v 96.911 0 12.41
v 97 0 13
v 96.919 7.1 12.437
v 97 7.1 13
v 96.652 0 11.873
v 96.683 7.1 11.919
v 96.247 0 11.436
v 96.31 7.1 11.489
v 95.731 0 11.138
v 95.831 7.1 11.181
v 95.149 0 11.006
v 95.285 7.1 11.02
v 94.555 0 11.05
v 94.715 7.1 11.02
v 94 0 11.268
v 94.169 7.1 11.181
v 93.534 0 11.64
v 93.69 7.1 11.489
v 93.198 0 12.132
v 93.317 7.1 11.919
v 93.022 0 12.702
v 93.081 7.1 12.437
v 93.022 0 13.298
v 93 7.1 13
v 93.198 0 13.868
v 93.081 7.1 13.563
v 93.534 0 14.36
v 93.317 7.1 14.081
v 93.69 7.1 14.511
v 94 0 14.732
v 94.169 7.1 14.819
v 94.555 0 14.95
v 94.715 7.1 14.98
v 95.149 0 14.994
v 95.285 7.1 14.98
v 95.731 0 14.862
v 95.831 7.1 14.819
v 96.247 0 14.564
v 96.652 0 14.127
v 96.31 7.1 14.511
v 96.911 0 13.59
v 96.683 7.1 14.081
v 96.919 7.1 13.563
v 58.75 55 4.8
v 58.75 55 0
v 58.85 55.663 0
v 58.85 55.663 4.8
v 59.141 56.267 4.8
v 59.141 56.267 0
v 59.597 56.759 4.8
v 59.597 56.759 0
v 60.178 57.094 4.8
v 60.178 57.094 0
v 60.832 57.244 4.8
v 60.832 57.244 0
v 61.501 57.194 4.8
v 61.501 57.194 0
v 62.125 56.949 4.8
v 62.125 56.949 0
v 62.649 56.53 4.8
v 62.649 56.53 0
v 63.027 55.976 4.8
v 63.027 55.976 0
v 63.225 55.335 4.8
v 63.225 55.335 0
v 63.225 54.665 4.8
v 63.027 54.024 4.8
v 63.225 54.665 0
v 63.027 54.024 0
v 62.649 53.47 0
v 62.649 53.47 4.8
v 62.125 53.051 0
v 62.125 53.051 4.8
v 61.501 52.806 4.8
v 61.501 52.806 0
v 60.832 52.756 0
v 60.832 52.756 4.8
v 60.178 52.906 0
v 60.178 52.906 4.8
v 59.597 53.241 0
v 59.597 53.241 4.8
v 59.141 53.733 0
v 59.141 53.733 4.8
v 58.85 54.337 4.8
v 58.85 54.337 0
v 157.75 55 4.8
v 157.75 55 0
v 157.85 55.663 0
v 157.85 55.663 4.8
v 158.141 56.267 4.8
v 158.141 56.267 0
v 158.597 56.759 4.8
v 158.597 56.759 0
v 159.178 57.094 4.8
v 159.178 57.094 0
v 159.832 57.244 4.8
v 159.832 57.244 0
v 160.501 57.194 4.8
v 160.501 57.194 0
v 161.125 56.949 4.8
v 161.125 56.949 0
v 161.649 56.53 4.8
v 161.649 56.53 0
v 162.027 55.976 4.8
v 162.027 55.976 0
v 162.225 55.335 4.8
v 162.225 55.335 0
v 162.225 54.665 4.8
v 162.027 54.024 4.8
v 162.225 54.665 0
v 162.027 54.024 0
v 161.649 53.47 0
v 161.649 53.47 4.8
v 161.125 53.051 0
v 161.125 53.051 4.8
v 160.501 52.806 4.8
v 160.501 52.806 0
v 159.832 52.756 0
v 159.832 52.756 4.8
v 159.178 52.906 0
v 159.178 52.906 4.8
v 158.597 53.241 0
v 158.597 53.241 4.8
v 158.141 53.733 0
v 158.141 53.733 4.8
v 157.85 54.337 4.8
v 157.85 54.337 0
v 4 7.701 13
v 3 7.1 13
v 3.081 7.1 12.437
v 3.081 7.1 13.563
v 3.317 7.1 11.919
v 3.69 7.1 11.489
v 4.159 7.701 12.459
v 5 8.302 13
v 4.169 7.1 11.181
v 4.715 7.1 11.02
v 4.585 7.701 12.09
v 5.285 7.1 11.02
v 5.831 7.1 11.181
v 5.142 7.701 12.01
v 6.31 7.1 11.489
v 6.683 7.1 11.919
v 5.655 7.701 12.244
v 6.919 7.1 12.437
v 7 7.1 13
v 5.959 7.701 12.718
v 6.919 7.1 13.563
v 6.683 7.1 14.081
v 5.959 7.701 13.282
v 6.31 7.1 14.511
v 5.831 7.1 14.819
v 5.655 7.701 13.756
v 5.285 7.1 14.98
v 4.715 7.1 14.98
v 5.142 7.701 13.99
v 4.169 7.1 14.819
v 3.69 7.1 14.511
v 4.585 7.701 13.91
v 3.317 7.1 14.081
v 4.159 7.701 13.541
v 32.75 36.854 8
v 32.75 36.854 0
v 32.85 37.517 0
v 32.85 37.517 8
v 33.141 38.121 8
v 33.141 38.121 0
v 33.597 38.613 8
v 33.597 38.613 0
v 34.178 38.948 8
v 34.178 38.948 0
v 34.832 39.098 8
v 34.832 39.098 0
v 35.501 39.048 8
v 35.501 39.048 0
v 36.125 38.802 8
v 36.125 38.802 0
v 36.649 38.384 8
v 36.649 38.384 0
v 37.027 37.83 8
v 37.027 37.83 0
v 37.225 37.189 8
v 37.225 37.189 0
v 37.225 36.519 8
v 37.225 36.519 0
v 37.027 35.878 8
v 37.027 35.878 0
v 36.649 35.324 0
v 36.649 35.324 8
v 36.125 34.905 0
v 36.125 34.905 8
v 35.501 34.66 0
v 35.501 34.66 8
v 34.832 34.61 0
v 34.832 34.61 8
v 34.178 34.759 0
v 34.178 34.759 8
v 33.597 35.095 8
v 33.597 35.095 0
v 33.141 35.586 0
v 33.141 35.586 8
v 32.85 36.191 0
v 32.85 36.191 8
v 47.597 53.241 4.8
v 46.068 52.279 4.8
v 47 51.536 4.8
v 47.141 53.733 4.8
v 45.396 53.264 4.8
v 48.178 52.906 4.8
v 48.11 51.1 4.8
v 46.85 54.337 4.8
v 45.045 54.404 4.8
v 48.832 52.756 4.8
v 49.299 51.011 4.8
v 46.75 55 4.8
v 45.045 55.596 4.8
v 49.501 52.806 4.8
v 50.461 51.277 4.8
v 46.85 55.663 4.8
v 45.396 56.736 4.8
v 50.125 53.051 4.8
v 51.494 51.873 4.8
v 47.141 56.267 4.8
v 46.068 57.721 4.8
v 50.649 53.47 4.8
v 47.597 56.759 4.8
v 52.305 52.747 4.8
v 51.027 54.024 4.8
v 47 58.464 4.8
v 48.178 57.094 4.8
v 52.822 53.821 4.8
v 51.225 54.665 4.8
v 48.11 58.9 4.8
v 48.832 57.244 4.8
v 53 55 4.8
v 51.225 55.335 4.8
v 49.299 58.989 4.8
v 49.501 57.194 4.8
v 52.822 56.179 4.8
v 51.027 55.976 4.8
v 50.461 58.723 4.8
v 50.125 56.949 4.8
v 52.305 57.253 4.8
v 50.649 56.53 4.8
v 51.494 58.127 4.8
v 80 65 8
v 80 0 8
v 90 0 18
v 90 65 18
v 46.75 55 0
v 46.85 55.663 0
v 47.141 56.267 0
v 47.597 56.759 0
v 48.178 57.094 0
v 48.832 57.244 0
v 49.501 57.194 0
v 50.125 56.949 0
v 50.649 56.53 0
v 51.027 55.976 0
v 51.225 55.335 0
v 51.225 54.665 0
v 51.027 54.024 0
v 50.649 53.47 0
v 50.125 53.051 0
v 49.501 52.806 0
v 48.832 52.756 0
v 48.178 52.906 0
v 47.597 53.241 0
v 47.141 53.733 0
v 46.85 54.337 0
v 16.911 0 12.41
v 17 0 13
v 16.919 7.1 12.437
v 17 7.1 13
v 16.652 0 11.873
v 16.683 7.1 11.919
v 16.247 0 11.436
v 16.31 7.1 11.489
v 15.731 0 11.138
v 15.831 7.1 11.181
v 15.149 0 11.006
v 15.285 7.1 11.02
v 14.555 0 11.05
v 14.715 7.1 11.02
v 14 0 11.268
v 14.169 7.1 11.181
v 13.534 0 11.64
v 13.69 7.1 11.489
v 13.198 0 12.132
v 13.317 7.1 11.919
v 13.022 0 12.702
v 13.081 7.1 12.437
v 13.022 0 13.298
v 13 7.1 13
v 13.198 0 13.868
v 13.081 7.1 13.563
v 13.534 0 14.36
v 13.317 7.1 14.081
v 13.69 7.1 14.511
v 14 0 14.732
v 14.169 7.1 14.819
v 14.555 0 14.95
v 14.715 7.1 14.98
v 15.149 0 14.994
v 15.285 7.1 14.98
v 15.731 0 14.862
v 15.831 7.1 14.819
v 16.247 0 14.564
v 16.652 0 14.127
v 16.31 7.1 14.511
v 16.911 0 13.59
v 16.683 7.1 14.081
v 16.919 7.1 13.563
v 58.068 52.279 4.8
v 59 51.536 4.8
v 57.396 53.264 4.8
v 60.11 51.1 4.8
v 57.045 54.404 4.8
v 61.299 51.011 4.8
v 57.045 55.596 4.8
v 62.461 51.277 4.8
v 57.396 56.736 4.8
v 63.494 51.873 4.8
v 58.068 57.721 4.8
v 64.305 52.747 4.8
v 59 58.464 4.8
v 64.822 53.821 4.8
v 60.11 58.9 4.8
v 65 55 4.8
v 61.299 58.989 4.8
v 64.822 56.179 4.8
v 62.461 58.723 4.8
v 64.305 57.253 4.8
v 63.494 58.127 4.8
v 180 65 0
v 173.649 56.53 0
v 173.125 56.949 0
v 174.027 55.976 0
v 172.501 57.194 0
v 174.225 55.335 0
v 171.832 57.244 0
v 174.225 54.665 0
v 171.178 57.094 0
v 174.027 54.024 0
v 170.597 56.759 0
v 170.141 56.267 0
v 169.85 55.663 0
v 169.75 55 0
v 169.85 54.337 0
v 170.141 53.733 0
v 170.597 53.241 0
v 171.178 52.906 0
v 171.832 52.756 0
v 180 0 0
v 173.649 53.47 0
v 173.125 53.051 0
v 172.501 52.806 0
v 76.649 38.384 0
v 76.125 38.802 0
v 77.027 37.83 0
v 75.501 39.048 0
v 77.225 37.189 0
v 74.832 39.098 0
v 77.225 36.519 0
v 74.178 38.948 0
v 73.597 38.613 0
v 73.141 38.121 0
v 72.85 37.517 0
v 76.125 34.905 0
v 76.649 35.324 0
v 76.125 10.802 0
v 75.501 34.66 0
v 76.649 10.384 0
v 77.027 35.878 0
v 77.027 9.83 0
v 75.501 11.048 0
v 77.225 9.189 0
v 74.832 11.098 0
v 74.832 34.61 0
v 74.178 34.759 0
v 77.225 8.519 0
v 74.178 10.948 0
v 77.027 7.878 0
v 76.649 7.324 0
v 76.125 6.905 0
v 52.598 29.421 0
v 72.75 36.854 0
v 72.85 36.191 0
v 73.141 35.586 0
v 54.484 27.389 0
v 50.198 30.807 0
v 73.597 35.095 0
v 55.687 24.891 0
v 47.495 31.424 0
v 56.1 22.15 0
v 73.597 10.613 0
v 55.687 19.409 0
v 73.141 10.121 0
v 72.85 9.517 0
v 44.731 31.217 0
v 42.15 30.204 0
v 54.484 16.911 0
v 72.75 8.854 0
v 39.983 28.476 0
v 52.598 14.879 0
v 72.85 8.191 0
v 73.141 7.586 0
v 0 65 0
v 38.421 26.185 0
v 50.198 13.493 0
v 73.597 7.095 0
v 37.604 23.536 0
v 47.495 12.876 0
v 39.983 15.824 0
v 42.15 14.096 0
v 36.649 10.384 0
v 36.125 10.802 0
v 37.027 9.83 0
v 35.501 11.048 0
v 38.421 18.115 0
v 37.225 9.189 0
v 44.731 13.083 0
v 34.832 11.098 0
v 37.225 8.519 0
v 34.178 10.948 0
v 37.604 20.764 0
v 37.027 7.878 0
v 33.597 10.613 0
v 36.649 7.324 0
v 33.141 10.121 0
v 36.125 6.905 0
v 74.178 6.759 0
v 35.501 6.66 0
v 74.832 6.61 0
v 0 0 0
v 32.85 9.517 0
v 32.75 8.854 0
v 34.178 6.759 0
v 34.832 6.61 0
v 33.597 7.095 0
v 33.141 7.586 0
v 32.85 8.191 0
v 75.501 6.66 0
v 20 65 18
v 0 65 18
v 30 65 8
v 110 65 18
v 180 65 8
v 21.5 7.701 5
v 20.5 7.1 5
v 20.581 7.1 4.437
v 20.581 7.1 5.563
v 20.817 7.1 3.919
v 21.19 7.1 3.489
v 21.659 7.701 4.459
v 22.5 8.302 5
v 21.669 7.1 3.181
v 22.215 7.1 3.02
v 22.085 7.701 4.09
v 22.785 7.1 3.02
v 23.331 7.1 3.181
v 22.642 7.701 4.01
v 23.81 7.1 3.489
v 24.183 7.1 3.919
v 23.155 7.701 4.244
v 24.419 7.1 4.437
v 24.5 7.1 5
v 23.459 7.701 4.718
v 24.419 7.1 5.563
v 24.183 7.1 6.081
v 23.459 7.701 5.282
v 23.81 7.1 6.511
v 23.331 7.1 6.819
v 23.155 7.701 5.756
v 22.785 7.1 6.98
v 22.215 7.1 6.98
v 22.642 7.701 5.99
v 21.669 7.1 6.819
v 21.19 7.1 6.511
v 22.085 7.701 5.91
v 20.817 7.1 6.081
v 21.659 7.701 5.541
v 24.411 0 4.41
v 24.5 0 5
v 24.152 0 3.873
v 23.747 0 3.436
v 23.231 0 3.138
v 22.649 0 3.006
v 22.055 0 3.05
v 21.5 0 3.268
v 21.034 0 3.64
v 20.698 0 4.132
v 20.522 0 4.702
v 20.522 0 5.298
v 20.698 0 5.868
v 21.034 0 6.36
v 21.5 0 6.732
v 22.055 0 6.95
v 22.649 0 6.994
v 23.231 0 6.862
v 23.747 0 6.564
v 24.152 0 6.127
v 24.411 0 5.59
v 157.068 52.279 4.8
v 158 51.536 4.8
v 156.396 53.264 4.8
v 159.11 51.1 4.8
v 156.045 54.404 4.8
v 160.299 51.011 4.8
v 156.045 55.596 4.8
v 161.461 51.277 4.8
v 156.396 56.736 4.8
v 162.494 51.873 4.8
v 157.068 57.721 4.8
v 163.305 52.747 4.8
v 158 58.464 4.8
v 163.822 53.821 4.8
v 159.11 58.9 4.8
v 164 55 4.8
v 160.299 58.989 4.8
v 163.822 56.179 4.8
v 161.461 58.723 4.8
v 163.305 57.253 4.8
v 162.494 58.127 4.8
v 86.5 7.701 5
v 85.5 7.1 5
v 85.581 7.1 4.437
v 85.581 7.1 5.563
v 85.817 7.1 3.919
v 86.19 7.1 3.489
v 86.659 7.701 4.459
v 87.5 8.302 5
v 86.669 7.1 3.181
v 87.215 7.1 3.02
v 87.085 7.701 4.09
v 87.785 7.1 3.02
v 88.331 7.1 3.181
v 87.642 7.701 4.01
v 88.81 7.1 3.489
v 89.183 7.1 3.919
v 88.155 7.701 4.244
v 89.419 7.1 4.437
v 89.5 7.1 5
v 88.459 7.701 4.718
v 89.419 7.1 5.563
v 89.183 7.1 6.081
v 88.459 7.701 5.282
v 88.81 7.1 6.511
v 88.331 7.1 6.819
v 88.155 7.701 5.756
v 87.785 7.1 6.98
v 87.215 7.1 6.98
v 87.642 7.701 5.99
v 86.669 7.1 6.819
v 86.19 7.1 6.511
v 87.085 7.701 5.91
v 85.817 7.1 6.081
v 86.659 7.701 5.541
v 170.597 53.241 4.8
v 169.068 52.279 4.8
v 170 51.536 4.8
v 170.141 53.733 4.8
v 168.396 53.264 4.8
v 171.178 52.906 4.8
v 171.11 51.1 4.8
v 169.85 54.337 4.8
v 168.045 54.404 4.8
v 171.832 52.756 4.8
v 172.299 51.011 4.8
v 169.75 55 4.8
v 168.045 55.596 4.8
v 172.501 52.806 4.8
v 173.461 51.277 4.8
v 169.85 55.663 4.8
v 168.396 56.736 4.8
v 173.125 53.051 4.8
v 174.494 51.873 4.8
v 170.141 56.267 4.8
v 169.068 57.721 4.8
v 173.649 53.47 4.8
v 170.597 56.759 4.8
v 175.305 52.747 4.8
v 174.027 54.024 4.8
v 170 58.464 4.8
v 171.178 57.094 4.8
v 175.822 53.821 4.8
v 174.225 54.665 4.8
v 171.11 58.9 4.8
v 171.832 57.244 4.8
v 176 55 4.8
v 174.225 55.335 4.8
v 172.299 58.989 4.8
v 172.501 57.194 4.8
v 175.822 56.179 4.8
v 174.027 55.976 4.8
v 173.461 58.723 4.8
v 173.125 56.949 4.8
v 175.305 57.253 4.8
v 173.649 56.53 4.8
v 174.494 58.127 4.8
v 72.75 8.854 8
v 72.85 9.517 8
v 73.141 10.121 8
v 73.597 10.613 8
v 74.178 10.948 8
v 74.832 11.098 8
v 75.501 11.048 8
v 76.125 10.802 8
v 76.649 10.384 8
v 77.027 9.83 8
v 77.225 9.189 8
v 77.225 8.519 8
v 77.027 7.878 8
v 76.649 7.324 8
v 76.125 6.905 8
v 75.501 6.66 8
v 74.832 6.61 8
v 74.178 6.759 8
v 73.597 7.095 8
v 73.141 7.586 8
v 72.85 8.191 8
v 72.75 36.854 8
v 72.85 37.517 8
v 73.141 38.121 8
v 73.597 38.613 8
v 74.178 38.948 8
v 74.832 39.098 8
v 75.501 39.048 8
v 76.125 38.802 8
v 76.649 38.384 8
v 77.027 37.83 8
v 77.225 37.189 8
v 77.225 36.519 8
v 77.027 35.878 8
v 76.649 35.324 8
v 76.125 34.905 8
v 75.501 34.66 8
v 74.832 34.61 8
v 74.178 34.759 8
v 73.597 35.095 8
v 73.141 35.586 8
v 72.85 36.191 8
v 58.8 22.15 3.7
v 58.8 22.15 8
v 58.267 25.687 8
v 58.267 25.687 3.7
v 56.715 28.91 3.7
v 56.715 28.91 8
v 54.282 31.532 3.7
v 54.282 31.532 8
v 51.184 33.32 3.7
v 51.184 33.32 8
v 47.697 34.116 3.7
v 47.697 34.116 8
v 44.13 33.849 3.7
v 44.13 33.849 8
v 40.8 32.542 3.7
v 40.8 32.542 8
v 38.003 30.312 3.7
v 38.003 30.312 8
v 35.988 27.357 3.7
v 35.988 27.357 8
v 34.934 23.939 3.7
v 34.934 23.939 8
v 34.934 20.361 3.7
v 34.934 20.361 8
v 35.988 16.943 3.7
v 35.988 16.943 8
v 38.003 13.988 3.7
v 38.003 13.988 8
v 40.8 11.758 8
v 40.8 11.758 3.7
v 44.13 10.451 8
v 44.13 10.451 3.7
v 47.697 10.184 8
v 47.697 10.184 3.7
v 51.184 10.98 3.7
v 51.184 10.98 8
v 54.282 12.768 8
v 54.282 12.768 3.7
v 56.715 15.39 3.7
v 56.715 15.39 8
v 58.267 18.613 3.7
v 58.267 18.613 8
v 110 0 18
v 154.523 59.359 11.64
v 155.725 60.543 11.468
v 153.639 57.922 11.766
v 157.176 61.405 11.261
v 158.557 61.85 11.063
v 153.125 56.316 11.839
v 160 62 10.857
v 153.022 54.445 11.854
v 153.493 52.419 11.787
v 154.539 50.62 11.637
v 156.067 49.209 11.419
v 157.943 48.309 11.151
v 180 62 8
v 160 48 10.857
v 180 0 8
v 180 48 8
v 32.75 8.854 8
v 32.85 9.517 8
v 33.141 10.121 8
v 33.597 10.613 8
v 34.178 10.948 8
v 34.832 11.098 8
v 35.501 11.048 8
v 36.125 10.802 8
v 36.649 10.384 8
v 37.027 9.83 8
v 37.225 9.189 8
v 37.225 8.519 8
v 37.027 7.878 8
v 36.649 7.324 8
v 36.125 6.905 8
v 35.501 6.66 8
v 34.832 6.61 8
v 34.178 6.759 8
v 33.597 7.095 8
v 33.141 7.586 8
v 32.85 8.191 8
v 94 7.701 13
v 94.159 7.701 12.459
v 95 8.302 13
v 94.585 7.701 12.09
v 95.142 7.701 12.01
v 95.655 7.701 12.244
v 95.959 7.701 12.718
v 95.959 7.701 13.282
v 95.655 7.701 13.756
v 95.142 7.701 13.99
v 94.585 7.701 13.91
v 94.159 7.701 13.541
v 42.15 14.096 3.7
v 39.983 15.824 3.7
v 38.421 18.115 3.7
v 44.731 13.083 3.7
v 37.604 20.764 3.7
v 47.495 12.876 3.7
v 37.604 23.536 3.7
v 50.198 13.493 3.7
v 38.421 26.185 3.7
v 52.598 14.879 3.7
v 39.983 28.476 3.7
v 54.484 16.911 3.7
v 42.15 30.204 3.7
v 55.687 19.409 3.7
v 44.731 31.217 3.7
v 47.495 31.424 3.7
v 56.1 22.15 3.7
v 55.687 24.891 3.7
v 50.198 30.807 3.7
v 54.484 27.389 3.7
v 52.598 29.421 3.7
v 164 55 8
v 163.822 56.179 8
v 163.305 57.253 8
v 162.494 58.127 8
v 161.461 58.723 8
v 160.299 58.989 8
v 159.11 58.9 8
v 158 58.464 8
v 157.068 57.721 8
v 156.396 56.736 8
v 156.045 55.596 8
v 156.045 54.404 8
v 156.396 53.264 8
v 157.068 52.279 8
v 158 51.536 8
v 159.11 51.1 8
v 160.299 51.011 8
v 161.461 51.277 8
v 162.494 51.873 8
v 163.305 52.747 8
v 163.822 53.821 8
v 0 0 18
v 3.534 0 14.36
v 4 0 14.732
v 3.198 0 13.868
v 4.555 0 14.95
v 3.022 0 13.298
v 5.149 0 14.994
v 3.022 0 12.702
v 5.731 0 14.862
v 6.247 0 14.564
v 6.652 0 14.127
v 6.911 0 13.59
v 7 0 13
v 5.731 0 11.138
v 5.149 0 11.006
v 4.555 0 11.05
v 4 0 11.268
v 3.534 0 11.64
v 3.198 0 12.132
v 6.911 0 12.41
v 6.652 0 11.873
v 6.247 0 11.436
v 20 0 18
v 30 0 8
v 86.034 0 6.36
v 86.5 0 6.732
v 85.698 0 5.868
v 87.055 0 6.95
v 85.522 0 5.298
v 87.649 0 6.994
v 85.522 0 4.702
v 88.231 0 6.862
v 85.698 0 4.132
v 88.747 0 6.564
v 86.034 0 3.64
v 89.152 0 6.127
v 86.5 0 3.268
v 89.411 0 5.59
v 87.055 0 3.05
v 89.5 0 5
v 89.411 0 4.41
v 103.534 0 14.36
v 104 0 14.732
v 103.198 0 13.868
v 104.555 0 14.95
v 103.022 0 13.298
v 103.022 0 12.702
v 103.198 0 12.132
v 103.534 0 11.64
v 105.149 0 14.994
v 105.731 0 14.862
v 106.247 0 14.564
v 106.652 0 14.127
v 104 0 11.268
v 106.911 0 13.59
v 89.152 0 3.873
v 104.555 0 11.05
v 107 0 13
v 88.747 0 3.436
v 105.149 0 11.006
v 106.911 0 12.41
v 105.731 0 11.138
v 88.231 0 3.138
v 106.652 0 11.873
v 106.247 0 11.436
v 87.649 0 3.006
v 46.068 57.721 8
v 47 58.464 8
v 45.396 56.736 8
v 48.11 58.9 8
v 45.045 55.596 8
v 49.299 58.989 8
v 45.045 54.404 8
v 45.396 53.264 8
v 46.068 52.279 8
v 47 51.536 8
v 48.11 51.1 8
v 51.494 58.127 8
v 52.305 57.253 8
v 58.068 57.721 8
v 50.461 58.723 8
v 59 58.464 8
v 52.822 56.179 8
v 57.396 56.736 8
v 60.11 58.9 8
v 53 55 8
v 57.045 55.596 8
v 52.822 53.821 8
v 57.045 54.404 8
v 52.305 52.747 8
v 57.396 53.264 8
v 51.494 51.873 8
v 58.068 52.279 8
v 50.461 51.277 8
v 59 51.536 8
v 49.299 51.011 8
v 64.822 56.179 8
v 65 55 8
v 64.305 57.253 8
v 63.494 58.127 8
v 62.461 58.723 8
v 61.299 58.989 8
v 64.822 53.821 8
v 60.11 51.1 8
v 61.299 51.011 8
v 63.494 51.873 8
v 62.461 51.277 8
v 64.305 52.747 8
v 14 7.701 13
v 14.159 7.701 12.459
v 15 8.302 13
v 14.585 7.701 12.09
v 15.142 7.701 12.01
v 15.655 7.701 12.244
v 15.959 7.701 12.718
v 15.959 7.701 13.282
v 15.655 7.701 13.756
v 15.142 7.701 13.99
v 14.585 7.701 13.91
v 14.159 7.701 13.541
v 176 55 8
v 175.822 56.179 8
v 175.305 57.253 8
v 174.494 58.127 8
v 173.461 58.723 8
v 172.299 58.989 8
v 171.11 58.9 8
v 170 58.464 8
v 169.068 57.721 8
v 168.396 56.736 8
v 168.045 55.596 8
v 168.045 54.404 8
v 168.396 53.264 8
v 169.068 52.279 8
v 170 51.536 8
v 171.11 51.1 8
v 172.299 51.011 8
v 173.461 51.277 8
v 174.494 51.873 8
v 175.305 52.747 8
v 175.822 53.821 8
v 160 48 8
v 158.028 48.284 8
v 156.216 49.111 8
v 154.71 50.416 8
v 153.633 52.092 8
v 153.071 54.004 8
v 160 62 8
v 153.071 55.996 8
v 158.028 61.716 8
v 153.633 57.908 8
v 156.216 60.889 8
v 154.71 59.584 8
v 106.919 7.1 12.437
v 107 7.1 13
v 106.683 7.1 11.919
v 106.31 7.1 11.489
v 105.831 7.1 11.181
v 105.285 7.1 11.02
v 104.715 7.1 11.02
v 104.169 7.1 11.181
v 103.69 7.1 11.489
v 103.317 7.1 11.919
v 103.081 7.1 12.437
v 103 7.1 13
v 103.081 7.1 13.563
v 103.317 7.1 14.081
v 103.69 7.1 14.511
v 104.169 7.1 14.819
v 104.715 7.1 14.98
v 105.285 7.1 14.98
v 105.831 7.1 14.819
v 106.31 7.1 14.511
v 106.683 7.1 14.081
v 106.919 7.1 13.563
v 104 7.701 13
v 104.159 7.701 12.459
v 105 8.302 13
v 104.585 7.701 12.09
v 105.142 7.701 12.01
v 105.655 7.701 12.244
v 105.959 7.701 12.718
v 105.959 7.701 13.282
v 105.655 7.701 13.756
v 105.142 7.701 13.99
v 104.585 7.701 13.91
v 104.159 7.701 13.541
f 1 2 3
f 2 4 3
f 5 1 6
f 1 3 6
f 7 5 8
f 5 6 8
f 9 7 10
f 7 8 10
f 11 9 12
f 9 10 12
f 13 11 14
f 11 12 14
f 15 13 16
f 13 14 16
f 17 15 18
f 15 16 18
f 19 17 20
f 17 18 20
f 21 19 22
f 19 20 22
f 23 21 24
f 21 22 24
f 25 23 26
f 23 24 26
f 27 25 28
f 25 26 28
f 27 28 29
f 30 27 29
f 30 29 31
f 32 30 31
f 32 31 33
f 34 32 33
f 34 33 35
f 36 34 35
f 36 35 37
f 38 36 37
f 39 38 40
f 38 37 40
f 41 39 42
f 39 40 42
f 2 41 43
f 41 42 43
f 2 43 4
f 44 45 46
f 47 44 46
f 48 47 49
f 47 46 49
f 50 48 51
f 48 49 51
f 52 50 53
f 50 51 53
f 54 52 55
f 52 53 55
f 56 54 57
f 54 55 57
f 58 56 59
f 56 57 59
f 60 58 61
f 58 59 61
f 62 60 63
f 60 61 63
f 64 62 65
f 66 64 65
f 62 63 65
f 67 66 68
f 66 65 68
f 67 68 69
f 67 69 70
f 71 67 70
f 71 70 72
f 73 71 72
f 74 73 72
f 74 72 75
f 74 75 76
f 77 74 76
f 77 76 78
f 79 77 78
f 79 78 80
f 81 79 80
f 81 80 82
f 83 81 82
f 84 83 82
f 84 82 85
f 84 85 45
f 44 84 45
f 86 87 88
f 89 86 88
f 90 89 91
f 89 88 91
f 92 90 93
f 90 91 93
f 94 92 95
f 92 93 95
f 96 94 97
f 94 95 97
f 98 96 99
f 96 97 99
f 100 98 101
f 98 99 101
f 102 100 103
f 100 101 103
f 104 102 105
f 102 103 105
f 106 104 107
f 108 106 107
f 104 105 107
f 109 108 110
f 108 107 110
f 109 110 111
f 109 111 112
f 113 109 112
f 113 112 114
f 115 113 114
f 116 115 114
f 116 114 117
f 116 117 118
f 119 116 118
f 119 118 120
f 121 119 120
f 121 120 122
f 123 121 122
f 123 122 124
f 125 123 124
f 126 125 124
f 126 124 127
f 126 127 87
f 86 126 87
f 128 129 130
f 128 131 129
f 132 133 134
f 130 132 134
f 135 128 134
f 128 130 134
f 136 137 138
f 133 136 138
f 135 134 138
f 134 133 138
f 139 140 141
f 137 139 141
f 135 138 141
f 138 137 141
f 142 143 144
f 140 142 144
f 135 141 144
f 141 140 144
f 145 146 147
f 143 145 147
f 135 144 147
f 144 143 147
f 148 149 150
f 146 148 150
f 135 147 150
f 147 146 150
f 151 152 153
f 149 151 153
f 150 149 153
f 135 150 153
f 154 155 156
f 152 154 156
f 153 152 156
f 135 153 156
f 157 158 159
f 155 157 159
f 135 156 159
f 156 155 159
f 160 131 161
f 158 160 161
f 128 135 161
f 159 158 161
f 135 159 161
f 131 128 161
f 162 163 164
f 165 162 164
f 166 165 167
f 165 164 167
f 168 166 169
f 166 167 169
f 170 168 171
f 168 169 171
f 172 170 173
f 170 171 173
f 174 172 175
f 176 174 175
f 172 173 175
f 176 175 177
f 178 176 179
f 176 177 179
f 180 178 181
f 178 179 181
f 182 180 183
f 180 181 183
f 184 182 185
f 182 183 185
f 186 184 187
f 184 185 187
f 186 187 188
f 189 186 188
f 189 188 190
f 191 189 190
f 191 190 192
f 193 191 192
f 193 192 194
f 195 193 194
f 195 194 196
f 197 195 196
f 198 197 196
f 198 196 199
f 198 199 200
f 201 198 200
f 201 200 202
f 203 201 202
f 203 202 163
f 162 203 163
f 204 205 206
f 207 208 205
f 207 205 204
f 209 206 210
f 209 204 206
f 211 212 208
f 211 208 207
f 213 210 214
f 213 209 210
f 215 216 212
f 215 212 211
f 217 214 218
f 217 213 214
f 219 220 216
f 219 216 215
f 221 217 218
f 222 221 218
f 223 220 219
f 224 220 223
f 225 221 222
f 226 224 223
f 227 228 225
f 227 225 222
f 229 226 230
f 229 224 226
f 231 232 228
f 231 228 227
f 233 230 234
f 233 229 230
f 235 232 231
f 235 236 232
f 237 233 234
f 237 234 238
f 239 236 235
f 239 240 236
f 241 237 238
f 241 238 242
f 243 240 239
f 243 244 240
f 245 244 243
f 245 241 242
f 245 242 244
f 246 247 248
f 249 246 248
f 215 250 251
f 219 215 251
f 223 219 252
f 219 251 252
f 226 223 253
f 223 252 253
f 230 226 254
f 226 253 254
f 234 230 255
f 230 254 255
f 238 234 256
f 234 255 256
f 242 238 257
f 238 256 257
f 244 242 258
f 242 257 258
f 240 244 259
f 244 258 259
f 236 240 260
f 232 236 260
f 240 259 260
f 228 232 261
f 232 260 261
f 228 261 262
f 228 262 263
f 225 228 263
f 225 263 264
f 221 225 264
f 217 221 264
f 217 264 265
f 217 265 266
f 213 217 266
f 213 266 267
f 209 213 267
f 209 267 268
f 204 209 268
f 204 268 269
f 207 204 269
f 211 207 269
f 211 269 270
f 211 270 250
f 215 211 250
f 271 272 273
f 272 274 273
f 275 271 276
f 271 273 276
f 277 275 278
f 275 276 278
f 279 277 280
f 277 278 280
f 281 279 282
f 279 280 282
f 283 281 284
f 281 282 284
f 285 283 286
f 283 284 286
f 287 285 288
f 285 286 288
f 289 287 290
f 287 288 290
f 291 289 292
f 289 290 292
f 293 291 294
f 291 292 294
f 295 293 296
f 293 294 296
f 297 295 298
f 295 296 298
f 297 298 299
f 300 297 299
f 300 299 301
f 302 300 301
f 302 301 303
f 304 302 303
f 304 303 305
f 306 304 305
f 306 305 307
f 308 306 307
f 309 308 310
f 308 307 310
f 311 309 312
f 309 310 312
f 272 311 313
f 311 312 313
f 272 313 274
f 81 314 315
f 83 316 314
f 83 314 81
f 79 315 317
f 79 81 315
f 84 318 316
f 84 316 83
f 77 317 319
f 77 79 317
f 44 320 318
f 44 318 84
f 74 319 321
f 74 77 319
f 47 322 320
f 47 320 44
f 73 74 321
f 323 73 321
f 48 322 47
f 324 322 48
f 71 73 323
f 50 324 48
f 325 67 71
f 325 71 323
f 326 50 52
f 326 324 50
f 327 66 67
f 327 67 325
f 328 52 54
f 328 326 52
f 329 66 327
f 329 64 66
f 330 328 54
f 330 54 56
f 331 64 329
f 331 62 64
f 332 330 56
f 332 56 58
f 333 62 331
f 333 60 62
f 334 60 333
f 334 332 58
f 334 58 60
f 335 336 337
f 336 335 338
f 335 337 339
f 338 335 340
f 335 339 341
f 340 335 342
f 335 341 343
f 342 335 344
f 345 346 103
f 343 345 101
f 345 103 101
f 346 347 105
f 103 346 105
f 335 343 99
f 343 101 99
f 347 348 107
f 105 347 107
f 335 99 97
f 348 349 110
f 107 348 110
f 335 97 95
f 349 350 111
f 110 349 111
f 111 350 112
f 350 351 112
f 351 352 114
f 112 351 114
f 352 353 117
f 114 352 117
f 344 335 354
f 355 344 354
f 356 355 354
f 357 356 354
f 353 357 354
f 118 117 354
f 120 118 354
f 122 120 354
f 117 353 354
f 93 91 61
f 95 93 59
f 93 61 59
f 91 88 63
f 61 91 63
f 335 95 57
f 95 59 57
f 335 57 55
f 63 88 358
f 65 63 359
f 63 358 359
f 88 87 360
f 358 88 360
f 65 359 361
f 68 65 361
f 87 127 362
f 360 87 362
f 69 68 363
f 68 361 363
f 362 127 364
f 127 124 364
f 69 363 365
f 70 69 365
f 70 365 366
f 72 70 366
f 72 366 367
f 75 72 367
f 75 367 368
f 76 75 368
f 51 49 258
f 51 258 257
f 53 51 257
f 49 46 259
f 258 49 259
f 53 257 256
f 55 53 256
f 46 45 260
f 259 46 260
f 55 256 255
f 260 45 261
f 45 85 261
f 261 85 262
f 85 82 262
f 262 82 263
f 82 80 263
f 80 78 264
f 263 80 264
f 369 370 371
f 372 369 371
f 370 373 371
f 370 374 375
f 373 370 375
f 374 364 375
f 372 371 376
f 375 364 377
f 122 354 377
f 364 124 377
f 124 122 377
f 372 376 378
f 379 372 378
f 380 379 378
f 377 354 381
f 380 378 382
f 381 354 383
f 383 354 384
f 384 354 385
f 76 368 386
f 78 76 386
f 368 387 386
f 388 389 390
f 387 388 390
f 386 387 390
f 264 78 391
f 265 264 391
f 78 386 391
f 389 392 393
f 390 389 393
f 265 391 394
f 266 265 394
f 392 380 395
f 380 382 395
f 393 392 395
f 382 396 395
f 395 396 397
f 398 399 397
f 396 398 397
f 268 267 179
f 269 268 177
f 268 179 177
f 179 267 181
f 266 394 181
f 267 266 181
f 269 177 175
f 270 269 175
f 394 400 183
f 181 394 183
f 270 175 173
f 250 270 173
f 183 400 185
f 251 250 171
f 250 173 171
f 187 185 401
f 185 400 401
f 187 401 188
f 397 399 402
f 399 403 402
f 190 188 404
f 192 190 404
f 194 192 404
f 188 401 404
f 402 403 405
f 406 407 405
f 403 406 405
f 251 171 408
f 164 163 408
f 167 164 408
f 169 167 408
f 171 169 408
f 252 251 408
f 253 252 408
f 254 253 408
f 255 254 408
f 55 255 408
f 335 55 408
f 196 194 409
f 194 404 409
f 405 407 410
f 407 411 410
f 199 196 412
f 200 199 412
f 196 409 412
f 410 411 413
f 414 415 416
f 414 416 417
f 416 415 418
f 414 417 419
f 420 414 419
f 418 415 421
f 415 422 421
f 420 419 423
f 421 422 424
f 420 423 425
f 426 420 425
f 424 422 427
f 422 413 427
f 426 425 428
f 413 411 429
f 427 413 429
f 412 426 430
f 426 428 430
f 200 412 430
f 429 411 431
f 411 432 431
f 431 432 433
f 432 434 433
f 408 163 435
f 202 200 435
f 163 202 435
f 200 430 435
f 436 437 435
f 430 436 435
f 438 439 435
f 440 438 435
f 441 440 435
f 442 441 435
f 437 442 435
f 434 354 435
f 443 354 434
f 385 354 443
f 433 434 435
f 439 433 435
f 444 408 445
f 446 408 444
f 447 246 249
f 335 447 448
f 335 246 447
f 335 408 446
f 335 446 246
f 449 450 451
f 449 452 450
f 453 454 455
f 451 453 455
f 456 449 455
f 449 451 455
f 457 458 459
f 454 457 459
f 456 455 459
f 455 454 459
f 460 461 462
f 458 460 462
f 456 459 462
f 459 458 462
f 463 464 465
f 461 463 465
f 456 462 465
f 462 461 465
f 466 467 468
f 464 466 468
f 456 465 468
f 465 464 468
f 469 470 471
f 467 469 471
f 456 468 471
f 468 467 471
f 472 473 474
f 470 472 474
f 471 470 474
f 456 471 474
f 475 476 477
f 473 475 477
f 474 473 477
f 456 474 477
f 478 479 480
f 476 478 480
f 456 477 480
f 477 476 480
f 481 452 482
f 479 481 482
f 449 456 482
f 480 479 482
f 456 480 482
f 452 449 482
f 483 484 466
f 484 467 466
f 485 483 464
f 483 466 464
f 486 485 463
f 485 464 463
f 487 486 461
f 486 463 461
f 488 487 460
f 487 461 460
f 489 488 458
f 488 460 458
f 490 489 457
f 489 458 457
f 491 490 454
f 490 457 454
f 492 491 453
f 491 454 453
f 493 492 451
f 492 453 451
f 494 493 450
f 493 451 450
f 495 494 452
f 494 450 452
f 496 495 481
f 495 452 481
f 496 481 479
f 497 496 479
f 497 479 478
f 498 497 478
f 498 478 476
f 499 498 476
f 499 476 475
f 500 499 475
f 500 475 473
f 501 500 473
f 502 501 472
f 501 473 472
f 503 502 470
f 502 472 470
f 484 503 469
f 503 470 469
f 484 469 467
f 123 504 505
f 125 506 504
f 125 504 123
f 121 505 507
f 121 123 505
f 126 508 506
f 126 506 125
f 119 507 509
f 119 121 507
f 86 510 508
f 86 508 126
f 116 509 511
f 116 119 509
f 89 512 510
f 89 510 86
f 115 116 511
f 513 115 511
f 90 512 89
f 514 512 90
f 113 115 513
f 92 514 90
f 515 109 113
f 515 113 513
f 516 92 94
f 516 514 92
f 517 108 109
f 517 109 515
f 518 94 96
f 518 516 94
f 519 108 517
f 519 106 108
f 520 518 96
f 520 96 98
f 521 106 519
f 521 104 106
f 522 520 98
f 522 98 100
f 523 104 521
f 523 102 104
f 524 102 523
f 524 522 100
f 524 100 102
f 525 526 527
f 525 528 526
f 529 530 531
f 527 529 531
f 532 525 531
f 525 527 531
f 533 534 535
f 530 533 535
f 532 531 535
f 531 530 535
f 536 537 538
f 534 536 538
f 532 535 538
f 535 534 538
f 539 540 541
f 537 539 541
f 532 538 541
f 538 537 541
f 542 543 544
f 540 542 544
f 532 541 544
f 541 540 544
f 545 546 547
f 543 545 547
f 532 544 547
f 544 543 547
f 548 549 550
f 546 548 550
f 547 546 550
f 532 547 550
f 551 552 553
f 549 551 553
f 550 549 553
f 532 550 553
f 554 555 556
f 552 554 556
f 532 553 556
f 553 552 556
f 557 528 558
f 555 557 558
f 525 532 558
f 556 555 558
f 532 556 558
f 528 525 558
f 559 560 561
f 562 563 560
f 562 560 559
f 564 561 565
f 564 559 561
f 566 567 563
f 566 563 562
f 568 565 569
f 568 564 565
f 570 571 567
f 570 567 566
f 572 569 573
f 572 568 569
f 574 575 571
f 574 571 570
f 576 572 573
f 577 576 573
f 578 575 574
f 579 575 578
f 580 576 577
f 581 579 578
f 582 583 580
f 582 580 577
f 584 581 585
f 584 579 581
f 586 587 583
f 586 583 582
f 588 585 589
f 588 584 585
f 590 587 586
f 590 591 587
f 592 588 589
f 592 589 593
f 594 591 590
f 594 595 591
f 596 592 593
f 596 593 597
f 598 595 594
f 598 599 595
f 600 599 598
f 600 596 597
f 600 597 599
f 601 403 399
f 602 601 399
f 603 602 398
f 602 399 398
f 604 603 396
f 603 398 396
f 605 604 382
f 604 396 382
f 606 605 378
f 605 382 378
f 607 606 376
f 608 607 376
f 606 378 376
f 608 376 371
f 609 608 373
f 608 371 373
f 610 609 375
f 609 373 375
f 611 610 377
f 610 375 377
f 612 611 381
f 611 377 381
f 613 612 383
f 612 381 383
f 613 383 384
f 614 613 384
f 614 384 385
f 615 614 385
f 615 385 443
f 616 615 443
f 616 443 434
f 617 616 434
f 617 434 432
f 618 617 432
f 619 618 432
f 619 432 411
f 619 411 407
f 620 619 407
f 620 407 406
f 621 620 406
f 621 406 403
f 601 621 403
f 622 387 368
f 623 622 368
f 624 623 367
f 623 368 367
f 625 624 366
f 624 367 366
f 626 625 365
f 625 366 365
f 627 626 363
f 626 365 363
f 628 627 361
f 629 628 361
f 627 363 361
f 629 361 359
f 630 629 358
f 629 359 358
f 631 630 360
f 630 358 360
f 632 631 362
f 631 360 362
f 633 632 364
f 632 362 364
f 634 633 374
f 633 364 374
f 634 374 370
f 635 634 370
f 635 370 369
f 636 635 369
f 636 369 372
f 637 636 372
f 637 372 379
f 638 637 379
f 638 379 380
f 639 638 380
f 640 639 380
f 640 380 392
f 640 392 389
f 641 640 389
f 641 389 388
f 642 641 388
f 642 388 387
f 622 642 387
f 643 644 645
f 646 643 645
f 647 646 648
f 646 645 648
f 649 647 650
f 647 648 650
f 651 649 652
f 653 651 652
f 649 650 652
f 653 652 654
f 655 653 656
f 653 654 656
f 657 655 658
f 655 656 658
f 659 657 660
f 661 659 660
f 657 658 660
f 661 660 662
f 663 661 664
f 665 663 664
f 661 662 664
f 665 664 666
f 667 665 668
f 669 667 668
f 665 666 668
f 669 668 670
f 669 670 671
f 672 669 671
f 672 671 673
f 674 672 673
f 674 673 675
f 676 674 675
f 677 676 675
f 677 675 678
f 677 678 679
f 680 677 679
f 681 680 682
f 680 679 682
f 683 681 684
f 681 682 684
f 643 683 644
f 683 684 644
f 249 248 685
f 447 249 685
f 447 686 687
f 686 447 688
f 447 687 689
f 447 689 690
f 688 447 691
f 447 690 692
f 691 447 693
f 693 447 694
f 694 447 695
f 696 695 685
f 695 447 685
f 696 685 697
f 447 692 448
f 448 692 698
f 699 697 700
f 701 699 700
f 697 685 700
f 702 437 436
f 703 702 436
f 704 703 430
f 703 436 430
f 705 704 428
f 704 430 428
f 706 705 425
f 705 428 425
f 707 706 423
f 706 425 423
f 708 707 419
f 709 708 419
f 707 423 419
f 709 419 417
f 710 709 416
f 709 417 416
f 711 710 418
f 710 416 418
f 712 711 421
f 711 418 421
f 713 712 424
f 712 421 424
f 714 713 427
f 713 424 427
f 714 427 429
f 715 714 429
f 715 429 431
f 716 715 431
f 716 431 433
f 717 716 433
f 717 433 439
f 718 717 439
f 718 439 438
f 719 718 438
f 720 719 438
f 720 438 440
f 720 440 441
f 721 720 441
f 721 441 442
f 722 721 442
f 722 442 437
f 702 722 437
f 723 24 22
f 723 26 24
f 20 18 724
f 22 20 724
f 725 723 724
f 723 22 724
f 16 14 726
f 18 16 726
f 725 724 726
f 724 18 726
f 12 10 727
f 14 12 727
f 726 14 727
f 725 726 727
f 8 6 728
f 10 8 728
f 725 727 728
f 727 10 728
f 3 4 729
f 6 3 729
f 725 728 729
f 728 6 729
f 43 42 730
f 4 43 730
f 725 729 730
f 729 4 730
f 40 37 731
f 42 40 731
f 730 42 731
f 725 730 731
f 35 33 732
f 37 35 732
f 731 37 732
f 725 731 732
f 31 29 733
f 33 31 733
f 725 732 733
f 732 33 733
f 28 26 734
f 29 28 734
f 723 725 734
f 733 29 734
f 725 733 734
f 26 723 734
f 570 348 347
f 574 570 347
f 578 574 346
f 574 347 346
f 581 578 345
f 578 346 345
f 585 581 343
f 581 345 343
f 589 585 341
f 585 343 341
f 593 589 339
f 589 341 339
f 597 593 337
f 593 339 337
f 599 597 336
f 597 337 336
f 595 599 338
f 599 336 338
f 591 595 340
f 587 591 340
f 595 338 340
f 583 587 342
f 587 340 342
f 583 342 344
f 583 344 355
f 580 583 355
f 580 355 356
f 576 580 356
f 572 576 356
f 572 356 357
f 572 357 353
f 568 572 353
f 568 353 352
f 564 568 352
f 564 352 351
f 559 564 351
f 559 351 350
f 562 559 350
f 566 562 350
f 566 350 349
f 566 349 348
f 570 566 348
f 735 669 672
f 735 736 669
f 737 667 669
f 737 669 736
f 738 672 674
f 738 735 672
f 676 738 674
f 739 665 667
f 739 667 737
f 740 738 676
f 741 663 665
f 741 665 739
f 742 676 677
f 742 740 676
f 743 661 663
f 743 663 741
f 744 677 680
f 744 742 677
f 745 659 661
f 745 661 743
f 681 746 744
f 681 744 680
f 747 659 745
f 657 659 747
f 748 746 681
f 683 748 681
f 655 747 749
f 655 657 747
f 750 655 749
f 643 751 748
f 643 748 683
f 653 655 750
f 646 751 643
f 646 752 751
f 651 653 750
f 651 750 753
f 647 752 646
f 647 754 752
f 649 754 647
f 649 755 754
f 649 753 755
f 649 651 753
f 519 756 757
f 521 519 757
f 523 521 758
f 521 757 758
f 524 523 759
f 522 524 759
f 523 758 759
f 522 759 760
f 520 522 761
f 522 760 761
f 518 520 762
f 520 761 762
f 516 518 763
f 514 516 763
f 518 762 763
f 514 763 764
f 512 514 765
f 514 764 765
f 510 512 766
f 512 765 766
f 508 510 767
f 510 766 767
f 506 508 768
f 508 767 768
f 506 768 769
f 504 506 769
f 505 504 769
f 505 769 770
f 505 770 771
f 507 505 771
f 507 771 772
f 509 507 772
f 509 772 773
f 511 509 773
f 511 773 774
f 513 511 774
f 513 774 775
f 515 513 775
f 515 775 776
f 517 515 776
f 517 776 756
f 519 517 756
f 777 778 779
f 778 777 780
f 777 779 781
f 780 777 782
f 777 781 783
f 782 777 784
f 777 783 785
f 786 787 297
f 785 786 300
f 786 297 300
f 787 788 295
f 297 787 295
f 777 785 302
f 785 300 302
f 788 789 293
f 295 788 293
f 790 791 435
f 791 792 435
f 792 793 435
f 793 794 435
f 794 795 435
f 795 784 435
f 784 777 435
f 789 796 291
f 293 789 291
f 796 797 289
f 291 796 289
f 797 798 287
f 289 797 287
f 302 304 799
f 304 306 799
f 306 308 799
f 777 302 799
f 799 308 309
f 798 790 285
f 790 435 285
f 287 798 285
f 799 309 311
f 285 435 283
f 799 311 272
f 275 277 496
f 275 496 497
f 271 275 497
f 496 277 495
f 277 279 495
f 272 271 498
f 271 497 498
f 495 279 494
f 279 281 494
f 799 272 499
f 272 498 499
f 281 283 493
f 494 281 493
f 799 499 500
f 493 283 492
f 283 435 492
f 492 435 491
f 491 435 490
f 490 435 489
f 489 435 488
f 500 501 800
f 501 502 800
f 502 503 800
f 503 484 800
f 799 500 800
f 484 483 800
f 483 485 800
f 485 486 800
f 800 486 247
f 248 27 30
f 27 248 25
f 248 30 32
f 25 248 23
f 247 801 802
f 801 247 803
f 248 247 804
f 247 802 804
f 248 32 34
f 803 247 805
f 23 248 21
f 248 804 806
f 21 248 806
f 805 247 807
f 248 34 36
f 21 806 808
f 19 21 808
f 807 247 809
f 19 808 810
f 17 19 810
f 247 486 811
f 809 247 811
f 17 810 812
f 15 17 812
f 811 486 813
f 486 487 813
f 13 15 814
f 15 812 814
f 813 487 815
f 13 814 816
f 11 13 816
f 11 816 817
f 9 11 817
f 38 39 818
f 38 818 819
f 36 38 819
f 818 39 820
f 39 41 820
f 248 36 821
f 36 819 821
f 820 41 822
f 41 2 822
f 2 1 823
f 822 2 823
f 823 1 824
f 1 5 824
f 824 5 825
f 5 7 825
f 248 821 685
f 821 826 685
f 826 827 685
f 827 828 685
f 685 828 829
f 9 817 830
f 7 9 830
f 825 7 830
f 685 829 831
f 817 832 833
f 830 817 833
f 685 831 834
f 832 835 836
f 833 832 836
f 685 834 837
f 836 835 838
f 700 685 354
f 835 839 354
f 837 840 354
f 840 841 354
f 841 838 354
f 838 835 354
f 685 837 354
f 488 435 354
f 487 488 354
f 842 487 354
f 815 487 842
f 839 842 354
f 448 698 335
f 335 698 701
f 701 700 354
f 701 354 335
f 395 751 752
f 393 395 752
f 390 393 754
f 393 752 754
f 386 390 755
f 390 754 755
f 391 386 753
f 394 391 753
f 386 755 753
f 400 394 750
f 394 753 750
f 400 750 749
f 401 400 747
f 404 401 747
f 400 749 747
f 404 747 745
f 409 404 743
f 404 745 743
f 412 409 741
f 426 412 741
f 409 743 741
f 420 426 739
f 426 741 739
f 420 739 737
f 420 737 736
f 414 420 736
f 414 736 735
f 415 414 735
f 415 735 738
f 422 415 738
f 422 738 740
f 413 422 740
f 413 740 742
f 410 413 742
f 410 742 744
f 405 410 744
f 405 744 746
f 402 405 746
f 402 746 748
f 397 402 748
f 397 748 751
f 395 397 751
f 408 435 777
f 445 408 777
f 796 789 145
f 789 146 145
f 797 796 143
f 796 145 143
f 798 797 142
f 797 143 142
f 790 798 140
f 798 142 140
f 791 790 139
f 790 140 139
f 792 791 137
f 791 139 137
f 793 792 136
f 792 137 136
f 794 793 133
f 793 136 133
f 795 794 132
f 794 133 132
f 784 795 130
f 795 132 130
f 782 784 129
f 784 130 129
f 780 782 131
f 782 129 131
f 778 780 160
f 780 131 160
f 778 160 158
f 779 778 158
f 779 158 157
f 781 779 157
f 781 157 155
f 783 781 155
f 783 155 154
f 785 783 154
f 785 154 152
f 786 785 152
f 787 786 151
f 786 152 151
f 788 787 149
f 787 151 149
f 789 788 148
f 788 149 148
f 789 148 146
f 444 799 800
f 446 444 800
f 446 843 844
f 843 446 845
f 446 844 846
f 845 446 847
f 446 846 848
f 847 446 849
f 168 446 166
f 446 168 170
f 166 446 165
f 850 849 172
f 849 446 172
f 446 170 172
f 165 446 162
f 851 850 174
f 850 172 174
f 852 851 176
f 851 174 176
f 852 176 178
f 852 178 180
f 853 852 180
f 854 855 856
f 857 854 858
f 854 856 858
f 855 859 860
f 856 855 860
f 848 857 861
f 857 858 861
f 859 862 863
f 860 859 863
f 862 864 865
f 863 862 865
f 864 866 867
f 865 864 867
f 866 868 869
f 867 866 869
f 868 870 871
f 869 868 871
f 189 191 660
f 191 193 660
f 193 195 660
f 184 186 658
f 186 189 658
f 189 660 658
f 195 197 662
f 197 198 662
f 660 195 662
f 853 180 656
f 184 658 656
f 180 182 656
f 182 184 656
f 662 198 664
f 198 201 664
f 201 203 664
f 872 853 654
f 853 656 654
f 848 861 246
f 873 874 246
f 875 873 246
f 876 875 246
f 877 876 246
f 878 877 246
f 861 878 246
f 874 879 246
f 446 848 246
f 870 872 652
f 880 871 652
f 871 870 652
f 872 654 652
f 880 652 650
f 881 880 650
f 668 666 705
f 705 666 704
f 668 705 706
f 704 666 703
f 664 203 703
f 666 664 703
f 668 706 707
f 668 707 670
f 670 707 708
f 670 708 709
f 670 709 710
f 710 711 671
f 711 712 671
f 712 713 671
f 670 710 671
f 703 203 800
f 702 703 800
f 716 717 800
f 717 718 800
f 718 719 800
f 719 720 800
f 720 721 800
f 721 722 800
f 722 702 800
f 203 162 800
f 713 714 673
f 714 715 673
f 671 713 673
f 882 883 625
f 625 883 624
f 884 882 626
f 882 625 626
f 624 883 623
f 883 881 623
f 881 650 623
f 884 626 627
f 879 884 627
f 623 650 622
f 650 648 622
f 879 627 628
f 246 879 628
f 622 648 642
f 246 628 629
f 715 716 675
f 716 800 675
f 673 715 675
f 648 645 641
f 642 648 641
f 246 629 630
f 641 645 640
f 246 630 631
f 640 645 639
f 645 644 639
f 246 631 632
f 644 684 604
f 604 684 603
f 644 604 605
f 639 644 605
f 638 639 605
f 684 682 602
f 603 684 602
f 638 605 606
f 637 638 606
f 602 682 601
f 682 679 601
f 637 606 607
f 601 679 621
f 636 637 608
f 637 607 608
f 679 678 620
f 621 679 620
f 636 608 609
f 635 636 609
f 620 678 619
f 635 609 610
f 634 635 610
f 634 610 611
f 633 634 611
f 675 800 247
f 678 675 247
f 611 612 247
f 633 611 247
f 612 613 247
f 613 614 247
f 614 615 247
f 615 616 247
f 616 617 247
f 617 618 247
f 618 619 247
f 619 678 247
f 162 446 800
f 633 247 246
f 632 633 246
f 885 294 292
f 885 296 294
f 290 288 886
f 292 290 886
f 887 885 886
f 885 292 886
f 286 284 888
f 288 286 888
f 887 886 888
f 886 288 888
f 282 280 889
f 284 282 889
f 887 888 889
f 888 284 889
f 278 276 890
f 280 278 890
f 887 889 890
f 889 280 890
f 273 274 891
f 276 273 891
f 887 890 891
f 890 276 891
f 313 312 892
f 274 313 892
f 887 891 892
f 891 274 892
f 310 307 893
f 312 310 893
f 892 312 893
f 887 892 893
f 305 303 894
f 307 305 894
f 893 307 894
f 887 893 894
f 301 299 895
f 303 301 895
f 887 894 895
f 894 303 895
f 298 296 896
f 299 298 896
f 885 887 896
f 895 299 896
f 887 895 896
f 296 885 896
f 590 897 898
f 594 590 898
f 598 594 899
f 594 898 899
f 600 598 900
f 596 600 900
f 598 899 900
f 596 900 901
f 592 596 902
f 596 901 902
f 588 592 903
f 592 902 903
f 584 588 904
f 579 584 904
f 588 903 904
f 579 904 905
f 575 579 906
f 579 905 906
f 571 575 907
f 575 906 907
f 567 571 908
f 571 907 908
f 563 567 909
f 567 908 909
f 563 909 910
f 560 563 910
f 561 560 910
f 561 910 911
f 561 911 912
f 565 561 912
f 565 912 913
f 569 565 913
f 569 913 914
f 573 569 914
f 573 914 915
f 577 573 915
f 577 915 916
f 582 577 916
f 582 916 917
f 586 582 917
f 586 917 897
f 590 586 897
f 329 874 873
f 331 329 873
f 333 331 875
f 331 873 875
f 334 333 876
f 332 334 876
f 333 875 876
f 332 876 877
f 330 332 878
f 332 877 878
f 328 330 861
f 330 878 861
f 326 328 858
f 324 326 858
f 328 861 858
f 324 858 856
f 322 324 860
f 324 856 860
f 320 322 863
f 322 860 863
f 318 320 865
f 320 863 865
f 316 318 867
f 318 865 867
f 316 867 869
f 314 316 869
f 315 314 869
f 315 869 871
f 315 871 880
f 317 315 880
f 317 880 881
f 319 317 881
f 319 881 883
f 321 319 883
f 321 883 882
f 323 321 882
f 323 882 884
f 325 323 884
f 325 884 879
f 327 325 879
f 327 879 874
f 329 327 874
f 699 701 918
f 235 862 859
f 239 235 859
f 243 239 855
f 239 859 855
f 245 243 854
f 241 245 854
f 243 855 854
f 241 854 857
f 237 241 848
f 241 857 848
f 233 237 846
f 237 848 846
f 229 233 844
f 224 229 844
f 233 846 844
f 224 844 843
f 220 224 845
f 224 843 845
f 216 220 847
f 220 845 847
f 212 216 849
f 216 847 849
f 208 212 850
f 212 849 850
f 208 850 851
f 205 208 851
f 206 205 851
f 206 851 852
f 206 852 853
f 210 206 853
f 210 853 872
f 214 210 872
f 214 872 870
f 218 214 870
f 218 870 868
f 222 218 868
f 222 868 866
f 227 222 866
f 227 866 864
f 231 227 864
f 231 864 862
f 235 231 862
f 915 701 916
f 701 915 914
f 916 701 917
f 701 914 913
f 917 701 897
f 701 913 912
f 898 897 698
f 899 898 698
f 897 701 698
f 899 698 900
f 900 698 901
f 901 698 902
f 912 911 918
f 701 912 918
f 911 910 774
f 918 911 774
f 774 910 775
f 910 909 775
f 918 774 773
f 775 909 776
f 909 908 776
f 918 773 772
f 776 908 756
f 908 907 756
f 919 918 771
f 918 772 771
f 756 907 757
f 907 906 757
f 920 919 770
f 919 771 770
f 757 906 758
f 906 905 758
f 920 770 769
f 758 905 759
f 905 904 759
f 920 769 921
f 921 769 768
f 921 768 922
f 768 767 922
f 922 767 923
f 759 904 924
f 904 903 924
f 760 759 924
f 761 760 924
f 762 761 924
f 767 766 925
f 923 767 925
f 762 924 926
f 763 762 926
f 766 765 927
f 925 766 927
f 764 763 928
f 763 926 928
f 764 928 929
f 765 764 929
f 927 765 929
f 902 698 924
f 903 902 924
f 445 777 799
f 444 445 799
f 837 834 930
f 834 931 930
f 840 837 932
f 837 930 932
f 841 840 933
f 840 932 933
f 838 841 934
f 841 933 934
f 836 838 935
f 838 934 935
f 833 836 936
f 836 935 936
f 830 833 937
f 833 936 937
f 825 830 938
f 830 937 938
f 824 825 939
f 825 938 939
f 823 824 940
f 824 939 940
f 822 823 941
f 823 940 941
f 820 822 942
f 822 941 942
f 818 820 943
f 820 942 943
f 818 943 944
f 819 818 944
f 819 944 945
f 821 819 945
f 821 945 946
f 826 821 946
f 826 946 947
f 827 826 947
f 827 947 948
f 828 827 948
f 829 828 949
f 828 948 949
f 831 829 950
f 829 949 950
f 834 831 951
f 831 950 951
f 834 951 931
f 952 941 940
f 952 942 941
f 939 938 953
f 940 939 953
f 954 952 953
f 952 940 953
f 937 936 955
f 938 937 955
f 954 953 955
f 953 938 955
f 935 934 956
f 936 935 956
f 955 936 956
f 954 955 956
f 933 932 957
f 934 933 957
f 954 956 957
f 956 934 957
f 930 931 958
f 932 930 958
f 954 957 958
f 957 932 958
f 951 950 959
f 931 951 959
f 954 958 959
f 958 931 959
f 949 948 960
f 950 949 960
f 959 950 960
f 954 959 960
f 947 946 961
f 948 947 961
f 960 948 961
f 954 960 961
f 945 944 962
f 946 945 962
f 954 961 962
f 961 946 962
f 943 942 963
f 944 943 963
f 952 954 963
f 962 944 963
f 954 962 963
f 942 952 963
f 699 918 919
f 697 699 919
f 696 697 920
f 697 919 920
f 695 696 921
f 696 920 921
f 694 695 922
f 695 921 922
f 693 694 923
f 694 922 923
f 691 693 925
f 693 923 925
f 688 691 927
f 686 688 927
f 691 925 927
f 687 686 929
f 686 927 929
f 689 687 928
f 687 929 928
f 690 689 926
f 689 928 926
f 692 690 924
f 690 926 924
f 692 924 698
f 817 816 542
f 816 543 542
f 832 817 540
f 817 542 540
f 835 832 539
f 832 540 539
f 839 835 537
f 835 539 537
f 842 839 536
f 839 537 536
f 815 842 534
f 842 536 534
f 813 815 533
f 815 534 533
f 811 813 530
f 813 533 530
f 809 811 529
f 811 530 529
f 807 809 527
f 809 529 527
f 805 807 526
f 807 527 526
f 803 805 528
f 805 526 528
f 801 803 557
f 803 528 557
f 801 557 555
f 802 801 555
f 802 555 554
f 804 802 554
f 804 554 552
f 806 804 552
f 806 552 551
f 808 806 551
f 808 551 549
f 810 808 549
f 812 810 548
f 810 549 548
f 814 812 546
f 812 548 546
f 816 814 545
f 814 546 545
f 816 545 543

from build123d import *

# Parameters (mm, degrees)
BOSS_EXTRUDE1_DEPTH                                 = 65
F_4_0MM_DOWEL_HOLE1_D                               = 4
F_4_0MM_DOWEL_HOLE1_DEPTH                           = 7.1
F_4_0MM_DOWEL_HOLE1_TIP                             = 1.201721238
CUT_EXTRUDE1_START                                  = 8
CUT_EXTRUDE1_DEPTH                                  = 8
CBORE_FOR_M4_HEX_SOCKET_HEAD_CAP_SCREW1_D           = 4.5
CBORE_FOR_M4_HEX_SOCKET_HEAD_CAP_SCREW1_DEPTH       = 8
CBORE_FOR_M4_HEX_SOCKET_HEAD_CAP_SCREW1_CBORE_D     = 8
CBORE_FOR_M4_HEX_SOCKET_HEAD_CAP_SCREW1_CBORE_DEPTH = 3.2
SKETCH8_R                                           = 12
CUT_EXTRUDE2_DEPTH                                  = 4.3
CUT_EXTRUDE3_REACH                                  = 5.7
SKETCH9_R                                           = 9.3
M4_CLEARANCE_HOLE1_D                                = 4.5
M4_CLEARANCE_HOLE1_DEPTH                            = 8


with BuildPart() as part:
    # Sketch2 → Boss-Extrude1 (new body)
    with BuildSketch(Plane(origin=(0, 0, 0), x_dir=(1, 0, 0), z_dir=(0, 1, 0))):
        Polygon((180, 0), (0, 0), (0, -18), (20, -18), (30, -8), (80, -8), (90, -18), (110, -18), (180, -8), align=None)
    extrude(amount=BOSS_EXTRUDE1_DEPTH)

    # Ø4.0mm Dowel Hole1
    with Locations(Plane(origin=(0, 0, 0), x_dir=(-1, 0, 0), z_dir=(0, -1, 0))):
        with Locations((-5, -13), (-15, -13), (-95, -13), (-105, -13), (-22.5, -5), (-87.5, -5)):
            Hole(F_4_0MM_DOWEL_HOLE1_D / 2, depth=F_4_0MM_DOWEL_HOLE1_DEPTH)
            with Locations((0, 0, -(F_4_0MM_DOWEL_HOLE1_DEPTH + F_4_0MM_DOWEL_HOLE1_TIP / 2))):  # 118° drill point
                Cone(0, F_4_0MM_DOWEL_HOLE1_D / 2, F_4_0MM_DOWEL_HOLE1_TIP, mode=Mode.SUBTRACT)

    # Sketch5 → Cut-Extrude1 (cut)
    with BuildSketch(Plane.XY.offset(CUT_EXTRUDE1_START)):
        with BuildLine():
            Line((180, 48), (160, 48))
            ThreePointArc((160, 48), (153, 55), (160, 62))
            Line((160, 62), (180, 62))
            ThreePointArc((180, 62), (187, 55), (180, 48))
        make_face()
    extrude(amount=CUT_EXTRUDE1_DEPTH, mode=Mode.SUBTRACT)

    # CBORE for M4 Hex Socket Head Cap Screw1
    with Locations(Plane.XY.offset(8)):
        with Locations((160, 55), (172, 55), (49, 55), (61, 55)):
            CounterBoreHole(CBORE_FOR_M4_HEX_SOCKET_HEAD_CAP_SCREW1_D / 2, CBORE_FOR_M4_HEX_SOCKET_HEAD_CAP_SCREW1_CBORE_D / 2, CBORE_FOR_M4_HEX_SOCKET_HEAD_CAP_SCREW1_CBORE_DEPTH, depth=CBORE_FOR_M4_HEX_SOCKET_HEAD_CAP_SCREW1_DEPTH)

    # Sketch8 → Cut-Extrude2 (cut)
    with BuildSketch(Plane.XY.offset(8)):
        with Locations((46.8, 22.15)):
            Circle(SKETCH8_R)
    extrude(amount=-CUT_EXTRUDE2_DEPTH, mode=Mode.SUBTRACT)

    # Sketch9 → Cut-Extrude3 (cut, up to next)
    with BuildSketch(Plane.XY.offset(3.7), mode=Mode.PRIVATE) as cut_extrude3_sk1:
        with Locations((46.8, 22.15)):
            Circle(SKETCH9_R)
    cut_extrude3_tool1 = extrude(cut_extrude3_sk1.sketch, amount=-CUT_EXTRUDE3_REACH, mode=Mode.PRIVATE) & part.part
    add(cut_extrude3_tool1.solids().sort_by_distance((46.8, 22.15, 3.7))[0], mode=Mode.SUBTRACT)

    # M4 Clearance Hole1
    with Locations(Plane.XY.offset(8)):
        with Locations((35, 36.853925583), (75, 36.853925583), (75, 8.853925583), (35, 8.853925583)):
            Hole(M4_CLEARANCE_HOLE1_D / 2, depth=M4_CLEARANCE_HOLE1_DEPTH)


solid = part.part
